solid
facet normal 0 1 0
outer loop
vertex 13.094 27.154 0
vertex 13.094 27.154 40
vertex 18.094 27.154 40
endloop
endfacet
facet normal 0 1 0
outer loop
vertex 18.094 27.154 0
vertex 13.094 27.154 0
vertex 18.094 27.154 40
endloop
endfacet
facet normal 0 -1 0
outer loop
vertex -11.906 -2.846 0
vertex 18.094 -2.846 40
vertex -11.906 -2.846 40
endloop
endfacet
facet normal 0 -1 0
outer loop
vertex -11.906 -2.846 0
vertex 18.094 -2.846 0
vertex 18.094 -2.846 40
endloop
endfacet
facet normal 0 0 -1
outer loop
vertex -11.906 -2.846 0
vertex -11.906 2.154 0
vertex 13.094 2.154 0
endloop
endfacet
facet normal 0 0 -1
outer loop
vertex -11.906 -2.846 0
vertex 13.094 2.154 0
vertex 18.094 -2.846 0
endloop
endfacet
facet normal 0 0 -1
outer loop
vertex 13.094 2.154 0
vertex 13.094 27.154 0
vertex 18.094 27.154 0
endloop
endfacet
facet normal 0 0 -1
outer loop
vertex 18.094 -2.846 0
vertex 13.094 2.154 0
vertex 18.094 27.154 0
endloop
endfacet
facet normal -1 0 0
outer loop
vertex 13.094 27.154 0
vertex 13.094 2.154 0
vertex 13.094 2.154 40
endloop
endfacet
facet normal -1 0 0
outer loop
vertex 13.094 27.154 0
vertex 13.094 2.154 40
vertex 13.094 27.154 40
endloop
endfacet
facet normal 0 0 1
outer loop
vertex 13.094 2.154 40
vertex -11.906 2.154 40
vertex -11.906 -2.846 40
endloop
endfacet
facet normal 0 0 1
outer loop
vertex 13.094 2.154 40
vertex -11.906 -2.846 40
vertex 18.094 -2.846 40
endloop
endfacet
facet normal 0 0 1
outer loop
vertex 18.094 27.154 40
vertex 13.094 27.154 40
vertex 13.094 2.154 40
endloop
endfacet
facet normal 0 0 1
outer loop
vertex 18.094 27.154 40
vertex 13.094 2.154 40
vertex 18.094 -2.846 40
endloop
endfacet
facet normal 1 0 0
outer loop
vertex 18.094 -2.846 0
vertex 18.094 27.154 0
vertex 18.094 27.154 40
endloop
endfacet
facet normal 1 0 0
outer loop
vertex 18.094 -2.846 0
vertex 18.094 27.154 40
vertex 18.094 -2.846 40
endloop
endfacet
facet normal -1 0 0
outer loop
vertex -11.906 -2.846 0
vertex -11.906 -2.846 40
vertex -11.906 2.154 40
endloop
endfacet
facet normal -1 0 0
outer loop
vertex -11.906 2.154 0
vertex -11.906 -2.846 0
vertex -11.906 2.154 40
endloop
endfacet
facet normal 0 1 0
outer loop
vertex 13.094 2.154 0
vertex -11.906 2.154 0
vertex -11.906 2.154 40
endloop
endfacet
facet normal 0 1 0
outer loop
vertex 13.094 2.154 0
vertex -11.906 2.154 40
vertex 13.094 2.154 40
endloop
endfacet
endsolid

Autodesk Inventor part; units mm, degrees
ref_plane "YZ Plane" through (0, 0, 0) normal (1, 0, 0) x (0, 1, 0)
ref_plane "XZ Plane" through (0, 0, 0) normal (0, 1, 0) x (-1, 0, 0)
ref_plane "XY Plane" through (0, 0, 0) normal (0, 0, 1) x (1, 0, 0)
sketch "Skizze1" plane through (0, 0, 0) normal (0, 0, 1) x (1, 0, 0)
  line L0 (-11.9065, 2.1537) -> (13.0935, 2.1537)
  line L1 (13.0935, 2.1537) -> (13.0935, 27.1537)
  line L2 (13.0935, 27.1537) -> (18.0935, 27.1537)
  line L3 (18.0935, 27.1537) -> (18.0935, -2.8463)
  line L4 (18.0935, -2.8463) -> (-11.9065, -2.8463)
  line L5 (-11.9065, -2.8463) -> (-11.9065, 2.1537)
  point P0 (0, 0)
  dimension "d0" = 5
  dimension "d1" = 5
  dimension "d2" = 30
  dimension "d3" = 30
extrude "Extrusion1" add sketch "Skizze1" along normal blind 40
properties part number "Beschlag_camera"
